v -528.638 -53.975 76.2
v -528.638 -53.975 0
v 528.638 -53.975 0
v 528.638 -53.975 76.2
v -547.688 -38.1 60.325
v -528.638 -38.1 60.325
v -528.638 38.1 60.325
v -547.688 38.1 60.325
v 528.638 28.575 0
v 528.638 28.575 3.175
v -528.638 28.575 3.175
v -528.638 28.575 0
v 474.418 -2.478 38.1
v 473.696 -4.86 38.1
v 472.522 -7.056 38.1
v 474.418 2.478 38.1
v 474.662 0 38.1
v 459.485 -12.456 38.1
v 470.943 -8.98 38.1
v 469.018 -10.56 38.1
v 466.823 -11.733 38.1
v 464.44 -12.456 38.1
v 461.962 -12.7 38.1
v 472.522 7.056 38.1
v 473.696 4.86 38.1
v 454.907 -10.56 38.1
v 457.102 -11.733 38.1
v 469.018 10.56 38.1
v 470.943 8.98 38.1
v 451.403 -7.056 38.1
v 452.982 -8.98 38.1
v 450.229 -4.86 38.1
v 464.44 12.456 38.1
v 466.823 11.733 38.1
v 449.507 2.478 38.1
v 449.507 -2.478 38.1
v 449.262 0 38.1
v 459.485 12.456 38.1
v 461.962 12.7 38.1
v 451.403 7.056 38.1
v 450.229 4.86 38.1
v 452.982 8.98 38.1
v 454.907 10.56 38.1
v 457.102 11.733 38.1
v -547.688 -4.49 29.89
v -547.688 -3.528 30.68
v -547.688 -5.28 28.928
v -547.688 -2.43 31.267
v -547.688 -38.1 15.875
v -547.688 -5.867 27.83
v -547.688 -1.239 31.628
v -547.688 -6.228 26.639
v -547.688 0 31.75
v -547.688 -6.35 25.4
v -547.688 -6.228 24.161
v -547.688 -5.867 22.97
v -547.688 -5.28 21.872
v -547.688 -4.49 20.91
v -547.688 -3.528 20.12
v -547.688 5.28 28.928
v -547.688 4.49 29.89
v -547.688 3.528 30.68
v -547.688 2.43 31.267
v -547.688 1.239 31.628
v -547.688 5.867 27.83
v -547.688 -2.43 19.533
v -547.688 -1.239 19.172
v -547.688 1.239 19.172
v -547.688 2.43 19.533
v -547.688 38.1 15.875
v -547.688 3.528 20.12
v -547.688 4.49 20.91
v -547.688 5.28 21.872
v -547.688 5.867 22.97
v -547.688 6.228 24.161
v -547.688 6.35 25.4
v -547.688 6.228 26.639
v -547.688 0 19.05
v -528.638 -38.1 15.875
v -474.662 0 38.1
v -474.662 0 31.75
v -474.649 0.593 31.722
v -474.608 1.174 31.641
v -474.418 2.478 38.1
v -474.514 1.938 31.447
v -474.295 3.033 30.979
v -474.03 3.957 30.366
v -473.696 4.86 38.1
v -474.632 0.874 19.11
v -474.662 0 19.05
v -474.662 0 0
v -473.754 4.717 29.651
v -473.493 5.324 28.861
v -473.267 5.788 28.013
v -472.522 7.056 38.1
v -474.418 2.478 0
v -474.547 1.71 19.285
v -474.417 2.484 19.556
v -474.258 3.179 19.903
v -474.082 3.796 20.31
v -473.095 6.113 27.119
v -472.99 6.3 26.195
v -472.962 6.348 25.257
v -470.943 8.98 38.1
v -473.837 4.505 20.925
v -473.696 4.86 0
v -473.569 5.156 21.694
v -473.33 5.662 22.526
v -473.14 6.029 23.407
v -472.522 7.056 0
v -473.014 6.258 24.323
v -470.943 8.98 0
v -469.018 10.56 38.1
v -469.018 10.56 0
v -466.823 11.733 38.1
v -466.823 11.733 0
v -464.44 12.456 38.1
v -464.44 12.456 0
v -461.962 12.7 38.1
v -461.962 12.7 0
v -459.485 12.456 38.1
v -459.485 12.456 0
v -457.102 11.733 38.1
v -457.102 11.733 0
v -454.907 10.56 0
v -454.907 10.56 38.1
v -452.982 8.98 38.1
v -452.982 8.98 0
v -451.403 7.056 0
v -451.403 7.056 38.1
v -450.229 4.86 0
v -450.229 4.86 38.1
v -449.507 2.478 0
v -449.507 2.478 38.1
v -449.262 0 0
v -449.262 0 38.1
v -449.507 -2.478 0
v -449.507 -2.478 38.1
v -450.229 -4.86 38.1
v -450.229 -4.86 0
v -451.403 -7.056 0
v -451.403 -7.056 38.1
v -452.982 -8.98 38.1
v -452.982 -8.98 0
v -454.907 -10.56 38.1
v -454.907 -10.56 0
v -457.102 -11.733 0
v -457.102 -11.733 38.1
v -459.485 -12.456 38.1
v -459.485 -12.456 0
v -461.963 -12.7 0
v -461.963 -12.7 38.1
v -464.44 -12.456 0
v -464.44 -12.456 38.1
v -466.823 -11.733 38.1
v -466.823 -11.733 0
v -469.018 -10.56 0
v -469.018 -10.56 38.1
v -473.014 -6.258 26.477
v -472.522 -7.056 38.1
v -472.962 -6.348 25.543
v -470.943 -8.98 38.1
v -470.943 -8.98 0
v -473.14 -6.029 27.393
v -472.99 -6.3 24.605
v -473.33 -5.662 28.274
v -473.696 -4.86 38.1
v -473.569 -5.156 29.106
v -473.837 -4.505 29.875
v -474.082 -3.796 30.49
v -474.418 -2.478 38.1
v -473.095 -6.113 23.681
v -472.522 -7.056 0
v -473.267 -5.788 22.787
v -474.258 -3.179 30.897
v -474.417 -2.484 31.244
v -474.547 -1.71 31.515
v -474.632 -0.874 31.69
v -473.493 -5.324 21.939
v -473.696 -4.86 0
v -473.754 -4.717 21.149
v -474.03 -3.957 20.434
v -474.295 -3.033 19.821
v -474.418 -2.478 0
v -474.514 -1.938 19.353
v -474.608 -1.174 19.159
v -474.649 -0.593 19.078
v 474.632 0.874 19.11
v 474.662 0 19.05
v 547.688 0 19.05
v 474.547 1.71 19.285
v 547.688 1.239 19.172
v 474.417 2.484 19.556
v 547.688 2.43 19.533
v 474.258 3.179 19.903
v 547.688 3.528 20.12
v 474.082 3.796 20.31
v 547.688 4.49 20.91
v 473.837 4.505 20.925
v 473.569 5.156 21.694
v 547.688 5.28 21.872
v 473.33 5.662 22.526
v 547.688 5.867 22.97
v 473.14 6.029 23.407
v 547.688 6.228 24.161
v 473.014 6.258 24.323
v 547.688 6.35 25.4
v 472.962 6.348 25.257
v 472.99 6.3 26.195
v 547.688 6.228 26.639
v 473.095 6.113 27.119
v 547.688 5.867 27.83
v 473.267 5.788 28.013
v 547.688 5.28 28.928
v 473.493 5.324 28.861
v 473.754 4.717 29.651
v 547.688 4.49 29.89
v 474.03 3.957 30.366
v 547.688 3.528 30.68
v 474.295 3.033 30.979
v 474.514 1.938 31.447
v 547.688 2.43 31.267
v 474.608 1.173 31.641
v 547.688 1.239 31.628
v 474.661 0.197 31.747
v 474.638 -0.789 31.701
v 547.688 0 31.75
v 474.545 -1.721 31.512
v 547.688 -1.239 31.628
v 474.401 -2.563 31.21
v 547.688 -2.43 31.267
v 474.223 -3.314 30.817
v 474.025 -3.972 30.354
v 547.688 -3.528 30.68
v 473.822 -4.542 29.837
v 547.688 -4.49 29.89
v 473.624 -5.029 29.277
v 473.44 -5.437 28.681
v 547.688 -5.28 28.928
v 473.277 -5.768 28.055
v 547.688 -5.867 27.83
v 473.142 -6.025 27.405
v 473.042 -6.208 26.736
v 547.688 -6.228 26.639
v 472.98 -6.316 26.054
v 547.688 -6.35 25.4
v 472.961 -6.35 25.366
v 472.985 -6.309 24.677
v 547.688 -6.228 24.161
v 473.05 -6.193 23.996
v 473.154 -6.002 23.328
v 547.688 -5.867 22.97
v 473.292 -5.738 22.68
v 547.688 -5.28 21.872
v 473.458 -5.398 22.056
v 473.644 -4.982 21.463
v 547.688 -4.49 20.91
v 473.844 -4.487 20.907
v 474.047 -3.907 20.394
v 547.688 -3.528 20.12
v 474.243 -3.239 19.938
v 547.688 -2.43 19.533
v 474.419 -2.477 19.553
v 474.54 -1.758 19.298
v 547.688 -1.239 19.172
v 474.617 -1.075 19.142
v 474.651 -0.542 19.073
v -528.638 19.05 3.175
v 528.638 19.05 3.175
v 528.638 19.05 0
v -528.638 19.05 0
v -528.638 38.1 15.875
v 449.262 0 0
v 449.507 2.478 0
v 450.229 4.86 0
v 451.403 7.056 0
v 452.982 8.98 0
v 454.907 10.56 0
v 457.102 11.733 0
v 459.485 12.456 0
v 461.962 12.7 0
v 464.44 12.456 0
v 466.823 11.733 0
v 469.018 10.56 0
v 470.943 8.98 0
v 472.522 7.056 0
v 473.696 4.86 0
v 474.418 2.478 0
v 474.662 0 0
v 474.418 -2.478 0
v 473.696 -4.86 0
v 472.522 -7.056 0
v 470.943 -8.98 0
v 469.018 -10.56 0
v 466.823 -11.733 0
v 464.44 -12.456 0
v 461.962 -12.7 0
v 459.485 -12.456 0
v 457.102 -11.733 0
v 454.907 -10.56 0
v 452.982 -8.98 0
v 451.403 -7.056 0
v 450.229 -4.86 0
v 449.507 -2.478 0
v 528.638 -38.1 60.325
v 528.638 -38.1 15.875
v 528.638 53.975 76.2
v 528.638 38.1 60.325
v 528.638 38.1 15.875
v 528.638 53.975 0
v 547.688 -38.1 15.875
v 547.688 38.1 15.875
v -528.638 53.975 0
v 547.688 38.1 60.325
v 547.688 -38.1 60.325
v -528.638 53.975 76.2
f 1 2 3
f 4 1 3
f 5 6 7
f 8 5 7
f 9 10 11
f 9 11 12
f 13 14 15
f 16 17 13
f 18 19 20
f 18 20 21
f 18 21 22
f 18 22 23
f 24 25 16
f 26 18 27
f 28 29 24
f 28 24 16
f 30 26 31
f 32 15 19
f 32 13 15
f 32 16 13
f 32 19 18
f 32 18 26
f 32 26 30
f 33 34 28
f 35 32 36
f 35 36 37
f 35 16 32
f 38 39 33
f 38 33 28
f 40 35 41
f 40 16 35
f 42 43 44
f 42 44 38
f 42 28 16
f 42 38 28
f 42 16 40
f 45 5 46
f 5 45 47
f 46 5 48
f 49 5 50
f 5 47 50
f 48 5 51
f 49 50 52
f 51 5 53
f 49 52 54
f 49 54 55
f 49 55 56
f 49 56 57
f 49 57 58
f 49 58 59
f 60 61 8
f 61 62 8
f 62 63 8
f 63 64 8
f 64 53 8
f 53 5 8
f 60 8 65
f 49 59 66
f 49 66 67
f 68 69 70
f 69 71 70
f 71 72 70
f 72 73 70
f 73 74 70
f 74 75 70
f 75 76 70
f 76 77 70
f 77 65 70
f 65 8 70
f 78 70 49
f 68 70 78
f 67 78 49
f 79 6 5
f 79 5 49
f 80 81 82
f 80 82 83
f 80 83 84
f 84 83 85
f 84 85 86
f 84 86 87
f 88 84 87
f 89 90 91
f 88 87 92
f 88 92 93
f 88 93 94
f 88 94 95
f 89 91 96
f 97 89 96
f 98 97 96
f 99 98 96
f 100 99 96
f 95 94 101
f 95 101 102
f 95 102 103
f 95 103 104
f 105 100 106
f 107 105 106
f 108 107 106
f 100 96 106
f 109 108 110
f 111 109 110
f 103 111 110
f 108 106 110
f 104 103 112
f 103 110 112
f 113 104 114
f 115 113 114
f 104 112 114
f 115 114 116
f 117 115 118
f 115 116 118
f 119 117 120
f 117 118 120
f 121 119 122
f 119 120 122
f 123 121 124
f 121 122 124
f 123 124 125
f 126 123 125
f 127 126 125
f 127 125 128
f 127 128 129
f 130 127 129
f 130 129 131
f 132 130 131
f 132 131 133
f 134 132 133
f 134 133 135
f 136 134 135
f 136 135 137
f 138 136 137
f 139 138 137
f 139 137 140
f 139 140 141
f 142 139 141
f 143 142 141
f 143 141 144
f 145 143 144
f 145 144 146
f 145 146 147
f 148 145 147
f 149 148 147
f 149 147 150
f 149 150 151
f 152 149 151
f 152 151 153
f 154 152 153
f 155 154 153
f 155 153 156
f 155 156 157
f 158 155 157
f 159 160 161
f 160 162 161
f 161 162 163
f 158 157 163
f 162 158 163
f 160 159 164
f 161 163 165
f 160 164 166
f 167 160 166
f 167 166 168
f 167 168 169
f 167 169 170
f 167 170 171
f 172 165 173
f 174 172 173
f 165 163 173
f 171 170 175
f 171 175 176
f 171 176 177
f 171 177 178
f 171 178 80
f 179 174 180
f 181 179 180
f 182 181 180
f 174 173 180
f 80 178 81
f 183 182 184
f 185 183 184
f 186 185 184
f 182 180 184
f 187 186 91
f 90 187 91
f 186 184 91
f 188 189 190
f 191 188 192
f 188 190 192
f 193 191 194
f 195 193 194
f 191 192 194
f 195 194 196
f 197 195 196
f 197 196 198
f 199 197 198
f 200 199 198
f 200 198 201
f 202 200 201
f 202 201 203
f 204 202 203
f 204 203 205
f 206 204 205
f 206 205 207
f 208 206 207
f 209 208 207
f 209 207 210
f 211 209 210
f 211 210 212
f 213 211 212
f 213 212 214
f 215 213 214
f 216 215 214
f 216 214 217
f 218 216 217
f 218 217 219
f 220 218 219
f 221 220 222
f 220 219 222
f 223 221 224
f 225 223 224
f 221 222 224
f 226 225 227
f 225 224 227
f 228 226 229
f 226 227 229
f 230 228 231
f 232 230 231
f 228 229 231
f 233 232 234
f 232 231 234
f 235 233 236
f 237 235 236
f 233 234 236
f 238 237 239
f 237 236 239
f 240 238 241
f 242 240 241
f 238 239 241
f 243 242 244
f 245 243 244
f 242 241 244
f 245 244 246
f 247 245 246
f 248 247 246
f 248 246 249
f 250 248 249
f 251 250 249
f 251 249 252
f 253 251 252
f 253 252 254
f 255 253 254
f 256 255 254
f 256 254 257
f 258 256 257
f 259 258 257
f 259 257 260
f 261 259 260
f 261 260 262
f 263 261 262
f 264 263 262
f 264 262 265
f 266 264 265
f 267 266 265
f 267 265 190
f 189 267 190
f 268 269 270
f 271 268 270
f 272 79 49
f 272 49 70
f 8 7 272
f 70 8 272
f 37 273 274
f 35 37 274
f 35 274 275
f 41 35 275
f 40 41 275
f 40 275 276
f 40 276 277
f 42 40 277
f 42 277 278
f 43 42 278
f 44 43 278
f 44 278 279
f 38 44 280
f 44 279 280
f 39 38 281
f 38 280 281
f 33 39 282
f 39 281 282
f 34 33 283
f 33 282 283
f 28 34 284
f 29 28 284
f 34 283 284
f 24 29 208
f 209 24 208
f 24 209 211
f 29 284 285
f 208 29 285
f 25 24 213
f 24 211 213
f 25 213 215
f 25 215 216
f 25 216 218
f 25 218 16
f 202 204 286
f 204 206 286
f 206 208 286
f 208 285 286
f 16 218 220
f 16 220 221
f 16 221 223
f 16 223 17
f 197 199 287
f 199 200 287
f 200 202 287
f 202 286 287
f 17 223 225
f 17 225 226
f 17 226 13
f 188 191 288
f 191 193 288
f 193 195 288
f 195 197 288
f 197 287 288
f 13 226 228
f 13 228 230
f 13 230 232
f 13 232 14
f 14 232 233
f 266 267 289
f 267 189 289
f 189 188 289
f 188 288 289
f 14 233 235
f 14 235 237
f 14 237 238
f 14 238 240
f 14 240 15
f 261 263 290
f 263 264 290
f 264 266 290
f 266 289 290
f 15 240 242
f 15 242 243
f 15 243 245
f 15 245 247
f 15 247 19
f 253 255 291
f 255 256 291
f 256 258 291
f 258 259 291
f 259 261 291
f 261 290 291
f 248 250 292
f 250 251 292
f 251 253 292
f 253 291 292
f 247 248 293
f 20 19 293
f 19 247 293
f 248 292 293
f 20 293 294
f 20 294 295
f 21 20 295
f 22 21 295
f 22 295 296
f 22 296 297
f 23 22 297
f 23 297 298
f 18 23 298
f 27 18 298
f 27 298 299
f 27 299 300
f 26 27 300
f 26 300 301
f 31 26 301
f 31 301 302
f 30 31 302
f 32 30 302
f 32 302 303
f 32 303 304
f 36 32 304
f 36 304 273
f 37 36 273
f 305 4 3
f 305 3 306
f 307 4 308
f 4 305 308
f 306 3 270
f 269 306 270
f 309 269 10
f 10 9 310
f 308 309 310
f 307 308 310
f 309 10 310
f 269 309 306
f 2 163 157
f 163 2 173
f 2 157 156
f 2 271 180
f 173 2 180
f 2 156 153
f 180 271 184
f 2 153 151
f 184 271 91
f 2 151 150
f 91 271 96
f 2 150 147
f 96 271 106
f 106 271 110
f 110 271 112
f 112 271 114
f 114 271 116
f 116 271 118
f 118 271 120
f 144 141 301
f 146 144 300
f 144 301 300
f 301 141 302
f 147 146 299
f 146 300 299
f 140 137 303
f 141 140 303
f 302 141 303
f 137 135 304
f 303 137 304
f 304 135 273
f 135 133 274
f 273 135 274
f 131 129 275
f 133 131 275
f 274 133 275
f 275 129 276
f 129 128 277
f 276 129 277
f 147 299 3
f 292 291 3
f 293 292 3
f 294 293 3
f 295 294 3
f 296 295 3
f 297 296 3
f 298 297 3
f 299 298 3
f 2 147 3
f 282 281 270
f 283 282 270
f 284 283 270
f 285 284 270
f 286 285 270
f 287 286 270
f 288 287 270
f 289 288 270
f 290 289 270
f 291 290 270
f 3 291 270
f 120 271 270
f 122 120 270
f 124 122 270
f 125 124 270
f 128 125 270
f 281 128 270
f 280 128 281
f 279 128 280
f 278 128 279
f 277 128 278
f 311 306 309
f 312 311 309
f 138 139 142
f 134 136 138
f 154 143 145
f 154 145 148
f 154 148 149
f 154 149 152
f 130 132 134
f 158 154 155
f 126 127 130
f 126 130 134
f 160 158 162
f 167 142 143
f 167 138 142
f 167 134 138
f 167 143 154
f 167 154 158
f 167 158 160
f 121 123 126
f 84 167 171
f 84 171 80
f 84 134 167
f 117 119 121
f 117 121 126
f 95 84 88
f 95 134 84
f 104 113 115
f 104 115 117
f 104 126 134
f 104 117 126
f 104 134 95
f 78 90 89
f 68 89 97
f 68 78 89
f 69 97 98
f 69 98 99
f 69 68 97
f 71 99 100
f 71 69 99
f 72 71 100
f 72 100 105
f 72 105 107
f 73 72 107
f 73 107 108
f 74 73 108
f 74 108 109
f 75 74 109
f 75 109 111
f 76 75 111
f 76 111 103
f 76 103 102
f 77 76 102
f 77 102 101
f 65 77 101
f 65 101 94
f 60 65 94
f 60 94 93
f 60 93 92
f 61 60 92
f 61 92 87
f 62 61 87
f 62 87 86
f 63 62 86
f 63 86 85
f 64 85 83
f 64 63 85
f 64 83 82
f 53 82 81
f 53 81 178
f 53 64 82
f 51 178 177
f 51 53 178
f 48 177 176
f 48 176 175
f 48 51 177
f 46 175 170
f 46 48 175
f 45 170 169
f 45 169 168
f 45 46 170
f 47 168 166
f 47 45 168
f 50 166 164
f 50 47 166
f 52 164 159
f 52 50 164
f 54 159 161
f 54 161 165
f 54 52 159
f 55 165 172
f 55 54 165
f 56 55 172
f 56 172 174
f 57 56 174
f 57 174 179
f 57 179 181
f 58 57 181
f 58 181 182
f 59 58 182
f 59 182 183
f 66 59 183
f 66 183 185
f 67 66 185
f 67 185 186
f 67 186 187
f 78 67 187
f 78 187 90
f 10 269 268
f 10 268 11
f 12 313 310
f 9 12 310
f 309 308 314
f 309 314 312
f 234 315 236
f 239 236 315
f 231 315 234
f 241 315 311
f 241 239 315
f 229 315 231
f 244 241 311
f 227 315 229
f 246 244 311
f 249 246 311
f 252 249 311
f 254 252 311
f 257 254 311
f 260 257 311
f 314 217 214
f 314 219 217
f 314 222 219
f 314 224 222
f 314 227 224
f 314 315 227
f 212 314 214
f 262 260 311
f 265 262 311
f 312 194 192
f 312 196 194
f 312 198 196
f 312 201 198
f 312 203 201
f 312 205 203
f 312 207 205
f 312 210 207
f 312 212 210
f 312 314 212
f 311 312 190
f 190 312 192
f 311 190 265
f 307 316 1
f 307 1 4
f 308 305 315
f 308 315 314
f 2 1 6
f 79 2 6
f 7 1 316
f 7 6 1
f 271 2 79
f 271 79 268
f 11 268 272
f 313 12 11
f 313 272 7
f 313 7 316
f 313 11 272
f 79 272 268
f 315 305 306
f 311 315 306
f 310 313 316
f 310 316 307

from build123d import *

# Parameters (mm, degrees)
SKETCH1_W           = 1057.275
SKETCH1_H           = 107.95
BOSS_EXTRUDE1_DEPTH = 76.2
SKETCH2_W           = 44.45
SKETCH2_H           = 76.2
BOSS_EXTRUDE2_DEPTH = 19.05
SKETCH3_R           = 6.35
CUT_EXTRUDE1_DEPTH  = 85.725
SKETCH4_W           = 3.175
SKETCH4_H           = 9.525
CUT_EXTRUDE2_DEPTH  = 1062.3906756
SKETCH5_R           = 12.7
CUT_EXTRUDE3_DEPTH  = 38.1


with BuildPart() as part:
    # Sketch1 → Boss-Extrude1 (new body)
    with BuildSketch(Plane.XY):
        Rectangle(SKETCH1_W, SKETCH1_H)
    extrude(amount=BOSS_EXTRUDE1_DEPTH)

    # Sketch2 → Boss-Extrude2 (add)
    with BuildSketch(Plane(origin=(528.6375, 0, 0), x_dir=(0, 0, -1), z_dir=(1, 0, 0))):
        with Locations((-38.1, 0)):
            Rectangle(SKETCH2_W, SKETCH2_H)
    boss_extrude2 = extrude(amount=BOSS_EXTRUDE2_DEPTH)

    # Sketch3 → Cut-Extrude1 (cut)
    with BuildSketch(Plane(origin=(547.6875, 0, 0), x_dir=(0, 0, -1), z_dir=(1, 0, 0))):
        with Locations((-25.4, 0)):
            Circle(SKETCH3_R)
    cut_extrude1 = extrude(amount=-CUT_EXTRUDE1_DEPTH, mode=Mode.SUBTRACT)

    # Sketch4 → Cut-Extrude2 (cut, through all)
    with BuildSketch(Plane(origin=(528.6375, 0, 0), x_dir=(0, 0, -1), z_dir=(1, 0, 0))):
        with Locations((-1.5875, 23.8125)):
            Rectangle(SKETCH4_W, SKETCH4_H)
    extrude(amount=-CUT_EXTRUDE2_DEPTH, mode=Mode.SUBTRACT)

    # Mirror1: Boss-Extrude2, Cut-Extrude1 across plane
    add(boss_extrude2.mirror(Plane(origin=(0, 0, 0), x_dir=(0, 0, 1), z_dir=(1, 0, 0))))
    add(cut_extrude1.mirror(Plane(origin=(0, 0, 0), x_dir=(0, 0, 1), z_dir=(1, 0, 0))), mode=Mode.SUBTRACT)

    # Sketch5 → Cut-Extrude3 (cut)
    with BuildSketch(Plane(origin=(0, 0, 0), x_dir=(-1, 0, 0), z_dir=(0, 0, -1))):
        with Locations((-461.9625, 0)):
            Circle(SKETCH5_R)
        with Locations((461.9625, 0)):
            Circle(SKETCH5_R)
    extrude(amount=-CUT_EXTRUDE3_DEPTH, mode=Mode.SUBTRACT)


solid = part.part
